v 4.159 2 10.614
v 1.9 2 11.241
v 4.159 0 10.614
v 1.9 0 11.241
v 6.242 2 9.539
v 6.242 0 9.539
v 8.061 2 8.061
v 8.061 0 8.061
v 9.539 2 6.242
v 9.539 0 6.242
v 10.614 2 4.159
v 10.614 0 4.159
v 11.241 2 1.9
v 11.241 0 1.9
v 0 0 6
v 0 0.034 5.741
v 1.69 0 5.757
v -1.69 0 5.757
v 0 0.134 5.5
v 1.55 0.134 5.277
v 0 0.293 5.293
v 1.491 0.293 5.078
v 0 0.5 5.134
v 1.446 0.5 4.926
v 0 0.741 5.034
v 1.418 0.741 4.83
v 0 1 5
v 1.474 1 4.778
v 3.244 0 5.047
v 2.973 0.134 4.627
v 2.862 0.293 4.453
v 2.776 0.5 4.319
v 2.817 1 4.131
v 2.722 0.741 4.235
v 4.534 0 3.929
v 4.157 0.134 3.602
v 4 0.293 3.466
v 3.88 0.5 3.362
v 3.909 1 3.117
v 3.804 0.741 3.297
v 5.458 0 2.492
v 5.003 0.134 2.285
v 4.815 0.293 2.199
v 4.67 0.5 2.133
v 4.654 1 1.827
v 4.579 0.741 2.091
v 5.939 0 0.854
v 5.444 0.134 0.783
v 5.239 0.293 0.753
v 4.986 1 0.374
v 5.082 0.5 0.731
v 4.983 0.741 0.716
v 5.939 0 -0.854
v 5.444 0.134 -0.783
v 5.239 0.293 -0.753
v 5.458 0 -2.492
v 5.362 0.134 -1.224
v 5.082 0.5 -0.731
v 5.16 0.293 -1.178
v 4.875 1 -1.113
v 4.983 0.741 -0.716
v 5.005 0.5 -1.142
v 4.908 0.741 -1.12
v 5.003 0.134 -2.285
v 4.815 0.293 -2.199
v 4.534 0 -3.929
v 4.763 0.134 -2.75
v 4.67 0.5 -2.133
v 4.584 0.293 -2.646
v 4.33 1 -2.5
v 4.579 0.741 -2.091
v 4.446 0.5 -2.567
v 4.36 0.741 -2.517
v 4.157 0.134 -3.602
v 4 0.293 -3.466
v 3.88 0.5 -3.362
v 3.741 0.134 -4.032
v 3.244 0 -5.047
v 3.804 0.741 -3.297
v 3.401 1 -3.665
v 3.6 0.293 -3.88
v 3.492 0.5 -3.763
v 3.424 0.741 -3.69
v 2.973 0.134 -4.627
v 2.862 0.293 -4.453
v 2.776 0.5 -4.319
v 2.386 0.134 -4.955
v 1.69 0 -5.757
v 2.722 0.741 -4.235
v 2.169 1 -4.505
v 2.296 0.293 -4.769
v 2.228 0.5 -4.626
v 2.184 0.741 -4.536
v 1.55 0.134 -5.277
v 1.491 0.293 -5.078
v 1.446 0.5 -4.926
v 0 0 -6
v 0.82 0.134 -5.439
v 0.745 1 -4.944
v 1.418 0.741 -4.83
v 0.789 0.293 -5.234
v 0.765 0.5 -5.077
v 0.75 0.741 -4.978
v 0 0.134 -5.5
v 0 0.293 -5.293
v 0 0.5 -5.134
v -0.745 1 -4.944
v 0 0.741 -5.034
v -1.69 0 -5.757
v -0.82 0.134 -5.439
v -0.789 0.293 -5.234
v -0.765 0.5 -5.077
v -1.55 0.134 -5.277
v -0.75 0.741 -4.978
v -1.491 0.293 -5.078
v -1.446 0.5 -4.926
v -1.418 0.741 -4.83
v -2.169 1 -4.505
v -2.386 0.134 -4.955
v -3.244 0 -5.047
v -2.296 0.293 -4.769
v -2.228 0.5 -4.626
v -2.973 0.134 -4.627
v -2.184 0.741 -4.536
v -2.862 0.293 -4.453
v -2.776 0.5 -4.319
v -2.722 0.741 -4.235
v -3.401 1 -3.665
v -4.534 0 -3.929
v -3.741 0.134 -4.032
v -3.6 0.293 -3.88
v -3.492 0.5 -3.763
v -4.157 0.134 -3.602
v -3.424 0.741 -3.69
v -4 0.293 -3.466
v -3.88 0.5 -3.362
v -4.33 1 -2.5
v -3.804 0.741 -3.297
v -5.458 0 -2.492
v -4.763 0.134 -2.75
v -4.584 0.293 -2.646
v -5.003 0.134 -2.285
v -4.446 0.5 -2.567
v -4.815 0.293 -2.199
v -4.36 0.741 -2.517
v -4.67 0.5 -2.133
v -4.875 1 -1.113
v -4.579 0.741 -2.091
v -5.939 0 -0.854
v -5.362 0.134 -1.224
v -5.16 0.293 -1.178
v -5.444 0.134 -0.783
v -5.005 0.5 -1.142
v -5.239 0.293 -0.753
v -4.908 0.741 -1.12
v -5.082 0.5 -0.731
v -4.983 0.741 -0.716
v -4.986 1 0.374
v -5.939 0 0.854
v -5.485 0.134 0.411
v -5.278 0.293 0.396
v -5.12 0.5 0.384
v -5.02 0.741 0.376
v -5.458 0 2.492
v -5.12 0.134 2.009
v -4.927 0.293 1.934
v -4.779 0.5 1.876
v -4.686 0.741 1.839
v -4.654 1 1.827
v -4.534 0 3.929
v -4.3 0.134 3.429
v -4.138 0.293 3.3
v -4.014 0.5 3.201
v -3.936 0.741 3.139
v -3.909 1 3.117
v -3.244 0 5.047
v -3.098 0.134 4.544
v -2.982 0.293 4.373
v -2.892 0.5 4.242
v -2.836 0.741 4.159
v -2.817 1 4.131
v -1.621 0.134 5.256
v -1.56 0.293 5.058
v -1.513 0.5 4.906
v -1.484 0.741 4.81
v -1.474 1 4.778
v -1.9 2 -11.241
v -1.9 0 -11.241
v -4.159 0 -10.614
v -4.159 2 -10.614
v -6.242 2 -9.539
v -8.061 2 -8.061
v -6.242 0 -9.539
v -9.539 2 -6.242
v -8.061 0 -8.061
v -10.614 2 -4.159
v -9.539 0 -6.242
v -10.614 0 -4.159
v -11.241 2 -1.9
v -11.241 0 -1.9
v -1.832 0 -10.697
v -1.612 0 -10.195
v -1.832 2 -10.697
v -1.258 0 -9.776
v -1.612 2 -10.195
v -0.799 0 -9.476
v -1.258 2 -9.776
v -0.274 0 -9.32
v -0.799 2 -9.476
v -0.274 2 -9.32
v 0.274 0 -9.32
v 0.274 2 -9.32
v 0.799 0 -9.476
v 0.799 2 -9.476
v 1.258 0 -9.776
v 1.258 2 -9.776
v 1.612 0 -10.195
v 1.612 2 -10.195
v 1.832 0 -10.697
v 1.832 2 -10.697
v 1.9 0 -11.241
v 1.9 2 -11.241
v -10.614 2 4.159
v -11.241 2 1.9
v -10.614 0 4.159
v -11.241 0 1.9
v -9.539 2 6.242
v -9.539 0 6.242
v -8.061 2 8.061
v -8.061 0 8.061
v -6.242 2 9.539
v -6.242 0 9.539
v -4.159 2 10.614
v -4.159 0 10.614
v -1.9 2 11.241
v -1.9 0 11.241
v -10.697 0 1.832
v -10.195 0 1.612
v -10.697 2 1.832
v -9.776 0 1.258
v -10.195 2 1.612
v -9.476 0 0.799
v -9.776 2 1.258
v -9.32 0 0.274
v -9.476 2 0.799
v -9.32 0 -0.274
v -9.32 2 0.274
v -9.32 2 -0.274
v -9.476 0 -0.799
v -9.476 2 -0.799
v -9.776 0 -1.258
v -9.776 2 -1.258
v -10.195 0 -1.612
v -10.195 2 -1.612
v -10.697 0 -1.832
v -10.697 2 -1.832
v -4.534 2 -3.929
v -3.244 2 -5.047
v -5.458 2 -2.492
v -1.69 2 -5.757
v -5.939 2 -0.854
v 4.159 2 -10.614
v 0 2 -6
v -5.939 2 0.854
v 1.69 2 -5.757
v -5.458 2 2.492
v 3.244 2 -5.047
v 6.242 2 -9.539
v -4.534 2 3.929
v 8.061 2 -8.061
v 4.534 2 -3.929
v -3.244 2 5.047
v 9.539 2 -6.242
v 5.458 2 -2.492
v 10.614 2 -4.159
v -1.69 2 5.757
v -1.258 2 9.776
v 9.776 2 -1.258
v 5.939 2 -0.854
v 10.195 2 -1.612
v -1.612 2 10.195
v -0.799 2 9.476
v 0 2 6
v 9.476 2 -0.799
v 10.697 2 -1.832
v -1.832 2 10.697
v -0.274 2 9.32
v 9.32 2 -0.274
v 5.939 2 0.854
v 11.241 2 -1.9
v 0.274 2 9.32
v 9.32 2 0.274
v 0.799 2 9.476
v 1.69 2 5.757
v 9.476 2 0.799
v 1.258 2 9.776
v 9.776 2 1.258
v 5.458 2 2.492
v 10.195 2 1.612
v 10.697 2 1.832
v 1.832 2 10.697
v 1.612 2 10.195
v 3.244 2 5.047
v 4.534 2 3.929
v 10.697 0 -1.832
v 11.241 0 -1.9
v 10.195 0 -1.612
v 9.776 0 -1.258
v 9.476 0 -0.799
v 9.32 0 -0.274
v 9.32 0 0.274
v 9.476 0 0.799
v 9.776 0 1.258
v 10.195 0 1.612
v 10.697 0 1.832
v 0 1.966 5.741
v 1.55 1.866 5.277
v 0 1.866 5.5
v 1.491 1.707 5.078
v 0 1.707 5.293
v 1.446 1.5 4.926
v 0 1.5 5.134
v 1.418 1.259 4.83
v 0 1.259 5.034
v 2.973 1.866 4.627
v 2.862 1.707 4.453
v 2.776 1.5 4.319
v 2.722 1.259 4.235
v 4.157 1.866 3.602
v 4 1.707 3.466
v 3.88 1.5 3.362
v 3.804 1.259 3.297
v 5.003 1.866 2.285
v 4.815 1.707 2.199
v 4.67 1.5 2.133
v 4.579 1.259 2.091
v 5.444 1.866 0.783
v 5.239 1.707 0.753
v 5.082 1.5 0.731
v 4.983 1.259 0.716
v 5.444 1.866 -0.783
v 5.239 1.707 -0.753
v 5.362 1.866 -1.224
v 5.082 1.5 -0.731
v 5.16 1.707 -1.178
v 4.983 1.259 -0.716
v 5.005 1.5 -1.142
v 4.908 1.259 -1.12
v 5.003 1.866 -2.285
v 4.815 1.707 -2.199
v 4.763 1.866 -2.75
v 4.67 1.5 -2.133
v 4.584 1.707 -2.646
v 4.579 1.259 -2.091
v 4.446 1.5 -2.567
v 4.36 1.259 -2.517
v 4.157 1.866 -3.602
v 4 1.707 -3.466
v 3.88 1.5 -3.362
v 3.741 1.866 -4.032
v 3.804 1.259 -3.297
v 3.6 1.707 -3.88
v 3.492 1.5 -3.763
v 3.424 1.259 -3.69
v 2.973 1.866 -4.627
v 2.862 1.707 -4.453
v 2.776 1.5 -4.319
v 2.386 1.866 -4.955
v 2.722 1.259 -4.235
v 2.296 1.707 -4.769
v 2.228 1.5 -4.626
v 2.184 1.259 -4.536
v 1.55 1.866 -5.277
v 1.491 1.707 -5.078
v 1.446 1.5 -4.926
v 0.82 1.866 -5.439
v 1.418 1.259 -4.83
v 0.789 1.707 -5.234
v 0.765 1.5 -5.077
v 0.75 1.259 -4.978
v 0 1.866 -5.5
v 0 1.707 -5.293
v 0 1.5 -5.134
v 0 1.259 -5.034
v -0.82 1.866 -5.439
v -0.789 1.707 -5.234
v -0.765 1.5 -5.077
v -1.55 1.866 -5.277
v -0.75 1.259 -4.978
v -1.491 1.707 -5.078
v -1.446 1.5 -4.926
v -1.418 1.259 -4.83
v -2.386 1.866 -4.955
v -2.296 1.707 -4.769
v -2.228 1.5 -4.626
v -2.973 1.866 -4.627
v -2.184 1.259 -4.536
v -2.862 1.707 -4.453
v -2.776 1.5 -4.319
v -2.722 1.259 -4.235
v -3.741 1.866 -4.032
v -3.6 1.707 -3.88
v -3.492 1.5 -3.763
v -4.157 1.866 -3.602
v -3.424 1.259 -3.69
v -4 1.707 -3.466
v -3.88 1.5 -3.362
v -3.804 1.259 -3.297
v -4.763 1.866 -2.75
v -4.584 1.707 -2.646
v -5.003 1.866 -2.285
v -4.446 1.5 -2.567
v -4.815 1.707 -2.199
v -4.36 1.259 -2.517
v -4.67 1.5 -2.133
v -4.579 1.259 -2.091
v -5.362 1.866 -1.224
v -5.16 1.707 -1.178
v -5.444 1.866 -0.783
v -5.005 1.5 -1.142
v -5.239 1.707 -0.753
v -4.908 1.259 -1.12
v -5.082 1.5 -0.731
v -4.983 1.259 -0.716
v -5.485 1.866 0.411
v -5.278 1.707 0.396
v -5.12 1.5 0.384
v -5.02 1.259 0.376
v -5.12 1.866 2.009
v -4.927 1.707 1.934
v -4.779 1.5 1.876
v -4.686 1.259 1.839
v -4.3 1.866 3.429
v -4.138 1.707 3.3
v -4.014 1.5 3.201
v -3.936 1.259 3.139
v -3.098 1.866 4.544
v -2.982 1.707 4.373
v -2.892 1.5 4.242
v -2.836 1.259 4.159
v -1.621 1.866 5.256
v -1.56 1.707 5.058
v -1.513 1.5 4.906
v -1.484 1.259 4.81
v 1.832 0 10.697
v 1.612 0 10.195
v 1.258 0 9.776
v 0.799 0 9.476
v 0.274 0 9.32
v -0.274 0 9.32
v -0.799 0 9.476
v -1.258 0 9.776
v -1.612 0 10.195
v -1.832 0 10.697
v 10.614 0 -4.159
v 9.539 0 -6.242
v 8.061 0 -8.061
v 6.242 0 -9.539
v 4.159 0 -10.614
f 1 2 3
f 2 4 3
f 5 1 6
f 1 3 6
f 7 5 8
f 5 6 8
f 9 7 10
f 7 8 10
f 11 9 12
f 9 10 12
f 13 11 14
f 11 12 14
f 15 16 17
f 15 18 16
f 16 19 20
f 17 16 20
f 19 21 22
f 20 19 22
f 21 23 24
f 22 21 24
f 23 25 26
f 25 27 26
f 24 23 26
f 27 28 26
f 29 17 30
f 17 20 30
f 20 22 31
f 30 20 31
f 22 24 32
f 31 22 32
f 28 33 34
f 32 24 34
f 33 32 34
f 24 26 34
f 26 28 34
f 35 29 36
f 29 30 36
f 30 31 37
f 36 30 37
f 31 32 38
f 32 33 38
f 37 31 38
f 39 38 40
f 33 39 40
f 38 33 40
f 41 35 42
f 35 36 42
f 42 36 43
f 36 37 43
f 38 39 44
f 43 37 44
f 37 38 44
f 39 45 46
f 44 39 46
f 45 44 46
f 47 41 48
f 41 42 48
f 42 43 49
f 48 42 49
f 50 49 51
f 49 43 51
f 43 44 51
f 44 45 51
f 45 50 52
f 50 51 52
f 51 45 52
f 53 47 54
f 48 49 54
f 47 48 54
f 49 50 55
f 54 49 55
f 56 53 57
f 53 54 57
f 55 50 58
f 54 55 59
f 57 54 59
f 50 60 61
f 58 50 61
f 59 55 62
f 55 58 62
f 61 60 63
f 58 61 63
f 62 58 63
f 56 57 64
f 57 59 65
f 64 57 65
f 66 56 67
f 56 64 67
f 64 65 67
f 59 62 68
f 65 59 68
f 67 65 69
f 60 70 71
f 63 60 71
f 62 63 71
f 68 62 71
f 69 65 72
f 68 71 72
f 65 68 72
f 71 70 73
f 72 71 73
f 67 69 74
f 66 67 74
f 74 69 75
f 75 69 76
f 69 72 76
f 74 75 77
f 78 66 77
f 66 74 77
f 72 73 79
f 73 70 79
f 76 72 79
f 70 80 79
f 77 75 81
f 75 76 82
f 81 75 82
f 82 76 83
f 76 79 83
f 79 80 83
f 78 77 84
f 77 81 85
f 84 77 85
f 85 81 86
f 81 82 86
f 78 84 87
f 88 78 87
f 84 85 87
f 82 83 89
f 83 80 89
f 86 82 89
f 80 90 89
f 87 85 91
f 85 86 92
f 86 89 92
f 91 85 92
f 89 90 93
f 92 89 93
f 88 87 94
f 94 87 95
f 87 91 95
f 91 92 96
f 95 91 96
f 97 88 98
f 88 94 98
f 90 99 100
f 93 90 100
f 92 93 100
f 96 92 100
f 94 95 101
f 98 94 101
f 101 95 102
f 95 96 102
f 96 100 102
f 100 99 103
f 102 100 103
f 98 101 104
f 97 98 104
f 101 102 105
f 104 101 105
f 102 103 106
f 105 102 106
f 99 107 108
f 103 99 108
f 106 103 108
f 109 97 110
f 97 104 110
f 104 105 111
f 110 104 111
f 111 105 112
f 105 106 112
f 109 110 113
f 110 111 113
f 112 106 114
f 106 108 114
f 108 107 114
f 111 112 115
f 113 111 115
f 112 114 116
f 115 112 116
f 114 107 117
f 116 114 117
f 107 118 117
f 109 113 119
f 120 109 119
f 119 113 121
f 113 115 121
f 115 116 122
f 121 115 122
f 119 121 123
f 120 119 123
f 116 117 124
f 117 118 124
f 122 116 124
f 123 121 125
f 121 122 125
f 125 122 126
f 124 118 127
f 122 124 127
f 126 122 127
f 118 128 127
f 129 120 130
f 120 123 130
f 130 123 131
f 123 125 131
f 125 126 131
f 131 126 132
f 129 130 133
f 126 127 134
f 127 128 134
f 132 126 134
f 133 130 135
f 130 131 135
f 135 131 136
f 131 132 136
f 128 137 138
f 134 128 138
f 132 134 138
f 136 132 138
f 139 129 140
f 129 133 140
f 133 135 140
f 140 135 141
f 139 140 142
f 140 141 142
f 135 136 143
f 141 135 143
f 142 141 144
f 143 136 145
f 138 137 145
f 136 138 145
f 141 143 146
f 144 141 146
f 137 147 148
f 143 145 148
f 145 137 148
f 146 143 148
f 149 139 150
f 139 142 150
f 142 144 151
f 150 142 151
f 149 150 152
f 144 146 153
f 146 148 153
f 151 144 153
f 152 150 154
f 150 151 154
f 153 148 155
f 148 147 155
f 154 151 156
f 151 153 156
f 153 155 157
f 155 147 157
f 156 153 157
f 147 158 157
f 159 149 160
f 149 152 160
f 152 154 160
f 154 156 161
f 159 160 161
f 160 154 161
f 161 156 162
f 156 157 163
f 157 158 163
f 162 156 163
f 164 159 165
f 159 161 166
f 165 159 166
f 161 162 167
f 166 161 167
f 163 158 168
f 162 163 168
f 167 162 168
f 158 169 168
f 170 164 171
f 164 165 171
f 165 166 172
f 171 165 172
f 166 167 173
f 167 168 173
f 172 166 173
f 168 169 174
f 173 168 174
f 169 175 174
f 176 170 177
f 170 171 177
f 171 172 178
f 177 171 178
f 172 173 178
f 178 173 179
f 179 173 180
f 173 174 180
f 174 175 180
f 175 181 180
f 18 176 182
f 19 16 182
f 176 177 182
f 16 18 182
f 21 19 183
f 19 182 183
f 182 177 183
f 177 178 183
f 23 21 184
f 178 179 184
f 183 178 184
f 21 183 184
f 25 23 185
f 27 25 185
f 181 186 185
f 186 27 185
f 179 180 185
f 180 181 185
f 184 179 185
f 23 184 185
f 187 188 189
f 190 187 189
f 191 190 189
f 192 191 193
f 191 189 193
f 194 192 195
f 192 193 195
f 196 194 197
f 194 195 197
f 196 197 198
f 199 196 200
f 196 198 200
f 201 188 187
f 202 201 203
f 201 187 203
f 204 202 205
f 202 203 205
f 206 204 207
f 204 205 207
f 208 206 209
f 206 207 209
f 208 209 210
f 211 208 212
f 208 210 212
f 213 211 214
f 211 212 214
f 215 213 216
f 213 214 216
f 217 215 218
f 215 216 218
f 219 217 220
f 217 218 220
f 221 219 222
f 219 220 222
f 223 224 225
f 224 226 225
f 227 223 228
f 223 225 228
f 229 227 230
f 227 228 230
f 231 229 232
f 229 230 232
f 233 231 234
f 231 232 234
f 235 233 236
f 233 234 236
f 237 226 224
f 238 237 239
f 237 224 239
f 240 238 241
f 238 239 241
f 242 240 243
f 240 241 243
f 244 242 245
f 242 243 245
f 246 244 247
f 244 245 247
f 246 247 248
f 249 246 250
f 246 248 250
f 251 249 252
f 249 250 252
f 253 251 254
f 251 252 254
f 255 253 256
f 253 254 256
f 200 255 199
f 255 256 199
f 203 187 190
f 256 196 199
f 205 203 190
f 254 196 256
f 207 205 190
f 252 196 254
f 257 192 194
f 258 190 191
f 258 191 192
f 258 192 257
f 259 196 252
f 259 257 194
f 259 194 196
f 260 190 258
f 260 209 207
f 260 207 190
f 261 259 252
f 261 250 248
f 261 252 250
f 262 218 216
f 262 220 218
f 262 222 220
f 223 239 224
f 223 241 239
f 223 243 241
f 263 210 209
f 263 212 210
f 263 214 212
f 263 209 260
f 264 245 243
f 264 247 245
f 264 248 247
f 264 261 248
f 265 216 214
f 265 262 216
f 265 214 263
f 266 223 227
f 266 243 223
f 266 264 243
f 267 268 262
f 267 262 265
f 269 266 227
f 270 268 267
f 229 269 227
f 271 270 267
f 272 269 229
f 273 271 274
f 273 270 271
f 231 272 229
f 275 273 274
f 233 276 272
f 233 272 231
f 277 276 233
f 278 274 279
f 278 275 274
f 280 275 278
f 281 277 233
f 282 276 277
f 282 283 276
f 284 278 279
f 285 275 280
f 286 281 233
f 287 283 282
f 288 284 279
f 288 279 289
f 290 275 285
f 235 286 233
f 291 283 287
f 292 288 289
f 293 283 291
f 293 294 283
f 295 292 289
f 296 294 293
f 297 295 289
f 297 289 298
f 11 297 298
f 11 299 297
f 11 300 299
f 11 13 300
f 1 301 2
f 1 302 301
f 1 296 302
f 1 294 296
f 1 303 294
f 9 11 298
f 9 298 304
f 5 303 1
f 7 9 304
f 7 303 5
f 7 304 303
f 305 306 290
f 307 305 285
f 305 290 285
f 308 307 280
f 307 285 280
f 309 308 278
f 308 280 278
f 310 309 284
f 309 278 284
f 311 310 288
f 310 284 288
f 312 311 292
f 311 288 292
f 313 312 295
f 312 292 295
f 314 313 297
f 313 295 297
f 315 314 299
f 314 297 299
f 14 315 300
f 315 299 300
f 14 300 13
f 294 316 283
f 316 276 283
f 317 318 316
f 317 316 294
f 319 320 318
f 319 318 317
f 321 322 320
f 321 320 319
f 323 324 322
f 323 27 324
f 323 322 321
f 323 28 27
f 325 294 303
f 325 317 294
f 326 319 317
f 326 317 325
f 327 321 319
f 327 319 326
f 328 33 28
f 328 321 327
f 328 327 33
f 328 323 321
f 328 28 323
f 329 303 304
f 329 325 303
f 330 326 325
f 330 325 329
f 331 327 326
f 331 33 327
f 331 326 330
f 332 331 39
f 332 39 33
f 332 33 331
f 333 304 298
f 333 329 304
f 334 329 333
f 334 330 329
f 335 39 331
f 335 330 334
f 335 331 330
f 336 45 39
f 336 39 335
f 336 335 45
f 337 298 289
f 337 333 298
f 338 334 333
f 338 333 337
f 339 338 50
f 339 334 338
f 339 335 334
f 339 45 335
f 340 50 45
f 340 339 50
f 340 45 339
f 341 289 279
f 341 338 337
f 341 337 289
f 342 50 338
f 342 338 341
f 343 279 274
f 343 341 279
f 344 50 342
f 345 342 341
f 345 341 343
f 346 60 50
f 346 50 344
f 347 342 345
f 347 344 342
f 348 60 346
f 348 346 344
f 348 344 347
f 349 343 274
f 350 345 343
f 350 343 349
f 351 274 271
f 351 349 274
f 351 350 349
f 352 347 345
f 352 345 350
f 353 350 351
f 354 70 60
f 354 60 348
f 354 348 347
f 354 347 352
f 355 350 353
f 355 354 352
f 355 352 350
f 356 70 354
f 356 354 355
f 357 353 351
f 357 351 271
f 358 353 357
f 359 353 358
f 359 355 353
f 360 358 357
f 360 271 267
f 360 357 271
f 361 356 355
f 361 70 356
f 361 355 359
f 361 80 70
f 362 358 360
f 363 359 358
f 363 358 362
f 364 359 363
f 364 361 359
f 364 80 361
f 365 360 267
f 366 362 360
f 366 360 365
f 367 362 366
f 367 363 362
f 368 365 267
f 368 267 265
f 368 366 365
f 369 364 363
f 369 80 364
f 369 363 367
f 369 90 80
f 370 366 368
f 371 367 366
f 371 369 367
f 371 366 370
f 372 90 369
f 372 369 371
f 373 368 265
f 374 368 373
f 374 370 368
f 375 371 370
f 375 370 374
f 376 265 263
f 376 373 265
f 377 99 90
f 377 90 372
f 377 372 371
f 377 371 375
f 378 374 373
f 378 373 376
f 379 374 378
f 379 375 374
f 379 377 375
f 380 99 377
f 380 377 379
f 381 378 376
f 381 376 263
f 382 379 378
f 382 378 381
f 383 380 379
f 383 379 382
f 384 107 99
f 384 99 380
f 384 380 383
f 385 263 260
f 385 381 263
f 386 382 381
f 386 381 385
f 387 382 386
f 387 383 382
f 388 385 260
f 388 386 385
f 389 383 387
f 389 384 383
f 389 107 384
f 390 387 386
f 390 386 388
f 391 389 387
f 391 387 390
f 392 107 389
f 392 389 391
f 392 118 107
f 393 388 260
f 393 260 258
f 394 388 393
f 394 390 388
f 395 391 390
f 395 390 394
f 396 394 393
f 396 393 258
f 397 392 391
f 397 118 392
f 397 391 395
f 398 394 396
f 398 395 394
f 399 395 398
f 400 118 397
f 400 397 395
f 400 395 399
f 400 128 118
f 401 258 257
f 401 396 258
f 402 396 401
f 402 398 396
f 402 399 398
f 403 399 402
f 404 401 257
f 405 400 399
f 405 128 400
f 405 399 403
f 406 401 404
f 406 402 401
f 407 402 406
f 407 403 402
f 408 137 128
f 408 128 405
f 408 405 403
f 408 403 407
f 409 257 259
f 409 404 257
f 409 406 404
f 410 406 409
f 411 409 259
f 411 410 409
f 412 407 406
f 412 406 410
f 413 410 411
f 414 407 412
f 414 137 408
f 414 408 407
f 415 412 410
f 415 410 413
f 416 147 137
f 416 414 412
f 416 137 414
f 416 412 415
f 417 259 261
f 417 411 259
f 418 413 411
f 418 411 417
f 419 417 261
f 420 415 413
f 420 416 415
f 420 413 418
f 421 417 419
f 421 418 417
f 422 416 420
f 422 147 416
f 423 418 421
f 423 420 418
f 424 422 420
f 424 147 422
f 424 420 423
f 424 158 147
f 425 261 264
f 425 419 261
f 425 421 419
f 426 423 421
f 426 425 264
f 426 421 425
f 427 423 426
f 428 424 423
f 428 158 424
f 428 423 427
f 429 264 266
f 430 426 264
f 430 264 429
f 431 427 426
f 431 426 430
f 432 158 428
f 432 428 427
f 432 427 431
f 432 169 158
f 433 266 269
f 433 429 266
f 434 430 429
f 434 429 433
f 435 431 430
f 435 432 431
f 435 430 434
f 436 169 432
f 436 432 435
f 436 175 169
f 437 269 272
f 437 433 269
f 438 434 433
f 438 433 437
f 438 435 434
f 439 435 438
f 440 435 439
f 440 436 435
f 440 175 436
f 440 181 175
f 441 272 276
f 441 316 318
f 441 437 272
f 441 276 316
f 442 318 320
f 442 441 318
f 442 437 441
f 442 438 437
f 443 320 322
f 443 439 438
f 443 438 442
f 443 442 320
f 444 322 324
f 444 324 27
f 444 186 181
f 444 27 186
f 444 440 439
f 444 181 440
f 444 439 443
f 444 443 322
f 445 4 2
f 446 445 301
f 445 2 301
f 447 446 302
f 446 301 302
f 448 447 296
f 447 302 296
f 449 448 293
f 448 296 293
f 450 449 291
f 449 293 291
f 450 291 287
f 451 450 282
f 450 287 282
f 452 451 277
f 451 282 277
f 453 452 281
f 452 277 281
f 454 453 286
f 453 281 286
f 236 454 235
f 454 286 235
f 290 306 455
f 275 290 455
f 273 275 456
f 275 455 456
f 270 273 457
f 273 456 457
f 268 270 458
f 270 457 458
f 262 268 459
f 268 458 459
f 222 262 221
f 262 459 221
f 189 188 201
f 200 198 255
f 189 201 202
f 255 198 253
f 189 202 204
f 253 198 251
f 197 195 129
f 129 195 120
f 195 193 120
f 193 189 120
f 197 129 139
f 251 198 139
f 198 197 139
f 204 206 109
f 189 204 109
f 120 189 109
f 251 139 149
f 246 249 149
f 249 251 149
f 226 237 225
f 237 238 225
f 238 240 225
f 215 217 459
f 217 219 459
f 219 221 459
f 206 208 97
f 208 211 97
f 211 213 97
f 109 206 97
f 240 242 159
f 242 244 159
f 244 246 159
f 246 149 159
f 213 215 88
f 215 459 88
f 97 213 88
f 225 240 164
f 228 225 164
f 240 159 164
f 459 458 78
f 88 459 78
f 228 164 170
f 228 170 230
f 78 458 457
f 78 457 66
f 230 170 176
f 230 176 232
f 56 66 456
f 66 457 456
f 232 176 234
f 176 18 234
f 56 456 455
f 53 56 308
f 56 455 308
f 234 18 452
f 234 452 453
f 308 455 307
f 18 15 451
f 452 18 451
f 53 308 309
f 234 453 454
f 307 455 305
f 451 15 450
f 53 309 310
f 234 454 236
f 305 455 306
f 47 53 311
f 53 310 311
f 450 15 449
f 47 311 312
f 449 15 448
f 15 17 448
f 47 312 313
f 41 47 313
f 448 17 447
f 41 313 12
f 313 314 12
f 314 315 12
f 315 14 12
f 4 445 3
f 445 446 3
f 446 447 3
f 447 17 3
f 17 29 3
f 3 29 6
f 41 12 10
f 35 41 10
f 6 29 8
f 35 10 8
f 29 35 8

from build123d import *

# Parameters (mm, degrees)
SKETCH2_R           = 13.2
BOSS_EXTRUDE1_DEPTH = 2
SKETCH3_R           = 1.9
CUT_EXTRUDE1_DEPTH  = 2
SKETCH4_R           = 5
CUT_EXTRUDE2_DEPTH  = 2
CIRPATTERN1_COUNT   = 4
FILLET2_R           = 1
CUT_EXTRUDE3_START  = -10
SKETCH6_R           = 13.2
SKETCH6_R_2         = 11.4
CUT_EXTRUDE3_DEPTH  = 10


with BuildPart() as part:
    # Sketch2 → Boss-Extrude1 (new body)
    with BuildSketch(Plane(origin=(0, 0, 0), x_dir=(1, 0, 0), z_dir=(0, 1, 0))):
        with Locations(Location((0, 0, 0), (0, 0, 270))):
            Circle(SKETCH2_R)
    extrude(amount=BOSS_EXTRUDE1_DEPTH)

    # Sketch3 → Cut-Extrude1 (cut)
    with BuildSketch(Plane(origin=(0, 2, 0), x_dir=(1, 0, 0), z_dir=(0, 1, 0))):
        with Locations(Location((0, 11.2, 0), (0, 0, 270))):
            Circle(SKETCH3_R)
    cut_extrude1 = extrude(amount=-CUT_EXTRUDE1_DEPTH, mode=Mode.SUBTRACT)

    # Sketch4 → Cut-Extrude2 (cut)
    with BuildSketch(Plane(origin=(0, 2, 0), x_dir=(1, 0, 0), z_dir=(0, 1, 0))):
        with Locations(Location((0, 0, 0), (0, 0, 270))):
            Circle(SKETCH4_R)
    extrude(amount=-CUT_EXTRUDE2_DEPTH, mode=Mode.SUBTRACT)

    # CirPattern1: Cut-Extrude1 ×4 about axis
    cirpattern1_axis = Axis((0, 0, 0), (0, 1, 0))
    for i in range(1, CIRPATTERN1_COUNT):
        add(cut_extrude1.rotate(cirpattern1_axis, i * 360 / CIRPATTERN1_COUNT), mode=Mode.SUBTRACT)

    # Fillet2
    fillet2_edges = [part.edges().sort_by_distance(p)[0] for p in [
        (0, 0, -5),
        (0, 2, -5),
    ]]
    fillet(fillet2_edges, radius=FILLET2_R - 0.0001)  # a hair under: the kernel refuses the full size

    # Sketch6 → Cut-Extrude3 (cut)
    with BuildSketch(Plane(origin=(0, 2, 0), x_dir=(1, 0, 0), z_dir=(0, 1, 0)).offset(CUT_EXTRUDE3_START)):
        Circle(SKETCH6_R)
        Circle(SKETCH6_R_2, mode=Mode.SUBTRACT)
    extrude(amount=CUT_EXTRUDE3_DEPTH, mode=Mode.SUBTRACT)


solid = part.part
